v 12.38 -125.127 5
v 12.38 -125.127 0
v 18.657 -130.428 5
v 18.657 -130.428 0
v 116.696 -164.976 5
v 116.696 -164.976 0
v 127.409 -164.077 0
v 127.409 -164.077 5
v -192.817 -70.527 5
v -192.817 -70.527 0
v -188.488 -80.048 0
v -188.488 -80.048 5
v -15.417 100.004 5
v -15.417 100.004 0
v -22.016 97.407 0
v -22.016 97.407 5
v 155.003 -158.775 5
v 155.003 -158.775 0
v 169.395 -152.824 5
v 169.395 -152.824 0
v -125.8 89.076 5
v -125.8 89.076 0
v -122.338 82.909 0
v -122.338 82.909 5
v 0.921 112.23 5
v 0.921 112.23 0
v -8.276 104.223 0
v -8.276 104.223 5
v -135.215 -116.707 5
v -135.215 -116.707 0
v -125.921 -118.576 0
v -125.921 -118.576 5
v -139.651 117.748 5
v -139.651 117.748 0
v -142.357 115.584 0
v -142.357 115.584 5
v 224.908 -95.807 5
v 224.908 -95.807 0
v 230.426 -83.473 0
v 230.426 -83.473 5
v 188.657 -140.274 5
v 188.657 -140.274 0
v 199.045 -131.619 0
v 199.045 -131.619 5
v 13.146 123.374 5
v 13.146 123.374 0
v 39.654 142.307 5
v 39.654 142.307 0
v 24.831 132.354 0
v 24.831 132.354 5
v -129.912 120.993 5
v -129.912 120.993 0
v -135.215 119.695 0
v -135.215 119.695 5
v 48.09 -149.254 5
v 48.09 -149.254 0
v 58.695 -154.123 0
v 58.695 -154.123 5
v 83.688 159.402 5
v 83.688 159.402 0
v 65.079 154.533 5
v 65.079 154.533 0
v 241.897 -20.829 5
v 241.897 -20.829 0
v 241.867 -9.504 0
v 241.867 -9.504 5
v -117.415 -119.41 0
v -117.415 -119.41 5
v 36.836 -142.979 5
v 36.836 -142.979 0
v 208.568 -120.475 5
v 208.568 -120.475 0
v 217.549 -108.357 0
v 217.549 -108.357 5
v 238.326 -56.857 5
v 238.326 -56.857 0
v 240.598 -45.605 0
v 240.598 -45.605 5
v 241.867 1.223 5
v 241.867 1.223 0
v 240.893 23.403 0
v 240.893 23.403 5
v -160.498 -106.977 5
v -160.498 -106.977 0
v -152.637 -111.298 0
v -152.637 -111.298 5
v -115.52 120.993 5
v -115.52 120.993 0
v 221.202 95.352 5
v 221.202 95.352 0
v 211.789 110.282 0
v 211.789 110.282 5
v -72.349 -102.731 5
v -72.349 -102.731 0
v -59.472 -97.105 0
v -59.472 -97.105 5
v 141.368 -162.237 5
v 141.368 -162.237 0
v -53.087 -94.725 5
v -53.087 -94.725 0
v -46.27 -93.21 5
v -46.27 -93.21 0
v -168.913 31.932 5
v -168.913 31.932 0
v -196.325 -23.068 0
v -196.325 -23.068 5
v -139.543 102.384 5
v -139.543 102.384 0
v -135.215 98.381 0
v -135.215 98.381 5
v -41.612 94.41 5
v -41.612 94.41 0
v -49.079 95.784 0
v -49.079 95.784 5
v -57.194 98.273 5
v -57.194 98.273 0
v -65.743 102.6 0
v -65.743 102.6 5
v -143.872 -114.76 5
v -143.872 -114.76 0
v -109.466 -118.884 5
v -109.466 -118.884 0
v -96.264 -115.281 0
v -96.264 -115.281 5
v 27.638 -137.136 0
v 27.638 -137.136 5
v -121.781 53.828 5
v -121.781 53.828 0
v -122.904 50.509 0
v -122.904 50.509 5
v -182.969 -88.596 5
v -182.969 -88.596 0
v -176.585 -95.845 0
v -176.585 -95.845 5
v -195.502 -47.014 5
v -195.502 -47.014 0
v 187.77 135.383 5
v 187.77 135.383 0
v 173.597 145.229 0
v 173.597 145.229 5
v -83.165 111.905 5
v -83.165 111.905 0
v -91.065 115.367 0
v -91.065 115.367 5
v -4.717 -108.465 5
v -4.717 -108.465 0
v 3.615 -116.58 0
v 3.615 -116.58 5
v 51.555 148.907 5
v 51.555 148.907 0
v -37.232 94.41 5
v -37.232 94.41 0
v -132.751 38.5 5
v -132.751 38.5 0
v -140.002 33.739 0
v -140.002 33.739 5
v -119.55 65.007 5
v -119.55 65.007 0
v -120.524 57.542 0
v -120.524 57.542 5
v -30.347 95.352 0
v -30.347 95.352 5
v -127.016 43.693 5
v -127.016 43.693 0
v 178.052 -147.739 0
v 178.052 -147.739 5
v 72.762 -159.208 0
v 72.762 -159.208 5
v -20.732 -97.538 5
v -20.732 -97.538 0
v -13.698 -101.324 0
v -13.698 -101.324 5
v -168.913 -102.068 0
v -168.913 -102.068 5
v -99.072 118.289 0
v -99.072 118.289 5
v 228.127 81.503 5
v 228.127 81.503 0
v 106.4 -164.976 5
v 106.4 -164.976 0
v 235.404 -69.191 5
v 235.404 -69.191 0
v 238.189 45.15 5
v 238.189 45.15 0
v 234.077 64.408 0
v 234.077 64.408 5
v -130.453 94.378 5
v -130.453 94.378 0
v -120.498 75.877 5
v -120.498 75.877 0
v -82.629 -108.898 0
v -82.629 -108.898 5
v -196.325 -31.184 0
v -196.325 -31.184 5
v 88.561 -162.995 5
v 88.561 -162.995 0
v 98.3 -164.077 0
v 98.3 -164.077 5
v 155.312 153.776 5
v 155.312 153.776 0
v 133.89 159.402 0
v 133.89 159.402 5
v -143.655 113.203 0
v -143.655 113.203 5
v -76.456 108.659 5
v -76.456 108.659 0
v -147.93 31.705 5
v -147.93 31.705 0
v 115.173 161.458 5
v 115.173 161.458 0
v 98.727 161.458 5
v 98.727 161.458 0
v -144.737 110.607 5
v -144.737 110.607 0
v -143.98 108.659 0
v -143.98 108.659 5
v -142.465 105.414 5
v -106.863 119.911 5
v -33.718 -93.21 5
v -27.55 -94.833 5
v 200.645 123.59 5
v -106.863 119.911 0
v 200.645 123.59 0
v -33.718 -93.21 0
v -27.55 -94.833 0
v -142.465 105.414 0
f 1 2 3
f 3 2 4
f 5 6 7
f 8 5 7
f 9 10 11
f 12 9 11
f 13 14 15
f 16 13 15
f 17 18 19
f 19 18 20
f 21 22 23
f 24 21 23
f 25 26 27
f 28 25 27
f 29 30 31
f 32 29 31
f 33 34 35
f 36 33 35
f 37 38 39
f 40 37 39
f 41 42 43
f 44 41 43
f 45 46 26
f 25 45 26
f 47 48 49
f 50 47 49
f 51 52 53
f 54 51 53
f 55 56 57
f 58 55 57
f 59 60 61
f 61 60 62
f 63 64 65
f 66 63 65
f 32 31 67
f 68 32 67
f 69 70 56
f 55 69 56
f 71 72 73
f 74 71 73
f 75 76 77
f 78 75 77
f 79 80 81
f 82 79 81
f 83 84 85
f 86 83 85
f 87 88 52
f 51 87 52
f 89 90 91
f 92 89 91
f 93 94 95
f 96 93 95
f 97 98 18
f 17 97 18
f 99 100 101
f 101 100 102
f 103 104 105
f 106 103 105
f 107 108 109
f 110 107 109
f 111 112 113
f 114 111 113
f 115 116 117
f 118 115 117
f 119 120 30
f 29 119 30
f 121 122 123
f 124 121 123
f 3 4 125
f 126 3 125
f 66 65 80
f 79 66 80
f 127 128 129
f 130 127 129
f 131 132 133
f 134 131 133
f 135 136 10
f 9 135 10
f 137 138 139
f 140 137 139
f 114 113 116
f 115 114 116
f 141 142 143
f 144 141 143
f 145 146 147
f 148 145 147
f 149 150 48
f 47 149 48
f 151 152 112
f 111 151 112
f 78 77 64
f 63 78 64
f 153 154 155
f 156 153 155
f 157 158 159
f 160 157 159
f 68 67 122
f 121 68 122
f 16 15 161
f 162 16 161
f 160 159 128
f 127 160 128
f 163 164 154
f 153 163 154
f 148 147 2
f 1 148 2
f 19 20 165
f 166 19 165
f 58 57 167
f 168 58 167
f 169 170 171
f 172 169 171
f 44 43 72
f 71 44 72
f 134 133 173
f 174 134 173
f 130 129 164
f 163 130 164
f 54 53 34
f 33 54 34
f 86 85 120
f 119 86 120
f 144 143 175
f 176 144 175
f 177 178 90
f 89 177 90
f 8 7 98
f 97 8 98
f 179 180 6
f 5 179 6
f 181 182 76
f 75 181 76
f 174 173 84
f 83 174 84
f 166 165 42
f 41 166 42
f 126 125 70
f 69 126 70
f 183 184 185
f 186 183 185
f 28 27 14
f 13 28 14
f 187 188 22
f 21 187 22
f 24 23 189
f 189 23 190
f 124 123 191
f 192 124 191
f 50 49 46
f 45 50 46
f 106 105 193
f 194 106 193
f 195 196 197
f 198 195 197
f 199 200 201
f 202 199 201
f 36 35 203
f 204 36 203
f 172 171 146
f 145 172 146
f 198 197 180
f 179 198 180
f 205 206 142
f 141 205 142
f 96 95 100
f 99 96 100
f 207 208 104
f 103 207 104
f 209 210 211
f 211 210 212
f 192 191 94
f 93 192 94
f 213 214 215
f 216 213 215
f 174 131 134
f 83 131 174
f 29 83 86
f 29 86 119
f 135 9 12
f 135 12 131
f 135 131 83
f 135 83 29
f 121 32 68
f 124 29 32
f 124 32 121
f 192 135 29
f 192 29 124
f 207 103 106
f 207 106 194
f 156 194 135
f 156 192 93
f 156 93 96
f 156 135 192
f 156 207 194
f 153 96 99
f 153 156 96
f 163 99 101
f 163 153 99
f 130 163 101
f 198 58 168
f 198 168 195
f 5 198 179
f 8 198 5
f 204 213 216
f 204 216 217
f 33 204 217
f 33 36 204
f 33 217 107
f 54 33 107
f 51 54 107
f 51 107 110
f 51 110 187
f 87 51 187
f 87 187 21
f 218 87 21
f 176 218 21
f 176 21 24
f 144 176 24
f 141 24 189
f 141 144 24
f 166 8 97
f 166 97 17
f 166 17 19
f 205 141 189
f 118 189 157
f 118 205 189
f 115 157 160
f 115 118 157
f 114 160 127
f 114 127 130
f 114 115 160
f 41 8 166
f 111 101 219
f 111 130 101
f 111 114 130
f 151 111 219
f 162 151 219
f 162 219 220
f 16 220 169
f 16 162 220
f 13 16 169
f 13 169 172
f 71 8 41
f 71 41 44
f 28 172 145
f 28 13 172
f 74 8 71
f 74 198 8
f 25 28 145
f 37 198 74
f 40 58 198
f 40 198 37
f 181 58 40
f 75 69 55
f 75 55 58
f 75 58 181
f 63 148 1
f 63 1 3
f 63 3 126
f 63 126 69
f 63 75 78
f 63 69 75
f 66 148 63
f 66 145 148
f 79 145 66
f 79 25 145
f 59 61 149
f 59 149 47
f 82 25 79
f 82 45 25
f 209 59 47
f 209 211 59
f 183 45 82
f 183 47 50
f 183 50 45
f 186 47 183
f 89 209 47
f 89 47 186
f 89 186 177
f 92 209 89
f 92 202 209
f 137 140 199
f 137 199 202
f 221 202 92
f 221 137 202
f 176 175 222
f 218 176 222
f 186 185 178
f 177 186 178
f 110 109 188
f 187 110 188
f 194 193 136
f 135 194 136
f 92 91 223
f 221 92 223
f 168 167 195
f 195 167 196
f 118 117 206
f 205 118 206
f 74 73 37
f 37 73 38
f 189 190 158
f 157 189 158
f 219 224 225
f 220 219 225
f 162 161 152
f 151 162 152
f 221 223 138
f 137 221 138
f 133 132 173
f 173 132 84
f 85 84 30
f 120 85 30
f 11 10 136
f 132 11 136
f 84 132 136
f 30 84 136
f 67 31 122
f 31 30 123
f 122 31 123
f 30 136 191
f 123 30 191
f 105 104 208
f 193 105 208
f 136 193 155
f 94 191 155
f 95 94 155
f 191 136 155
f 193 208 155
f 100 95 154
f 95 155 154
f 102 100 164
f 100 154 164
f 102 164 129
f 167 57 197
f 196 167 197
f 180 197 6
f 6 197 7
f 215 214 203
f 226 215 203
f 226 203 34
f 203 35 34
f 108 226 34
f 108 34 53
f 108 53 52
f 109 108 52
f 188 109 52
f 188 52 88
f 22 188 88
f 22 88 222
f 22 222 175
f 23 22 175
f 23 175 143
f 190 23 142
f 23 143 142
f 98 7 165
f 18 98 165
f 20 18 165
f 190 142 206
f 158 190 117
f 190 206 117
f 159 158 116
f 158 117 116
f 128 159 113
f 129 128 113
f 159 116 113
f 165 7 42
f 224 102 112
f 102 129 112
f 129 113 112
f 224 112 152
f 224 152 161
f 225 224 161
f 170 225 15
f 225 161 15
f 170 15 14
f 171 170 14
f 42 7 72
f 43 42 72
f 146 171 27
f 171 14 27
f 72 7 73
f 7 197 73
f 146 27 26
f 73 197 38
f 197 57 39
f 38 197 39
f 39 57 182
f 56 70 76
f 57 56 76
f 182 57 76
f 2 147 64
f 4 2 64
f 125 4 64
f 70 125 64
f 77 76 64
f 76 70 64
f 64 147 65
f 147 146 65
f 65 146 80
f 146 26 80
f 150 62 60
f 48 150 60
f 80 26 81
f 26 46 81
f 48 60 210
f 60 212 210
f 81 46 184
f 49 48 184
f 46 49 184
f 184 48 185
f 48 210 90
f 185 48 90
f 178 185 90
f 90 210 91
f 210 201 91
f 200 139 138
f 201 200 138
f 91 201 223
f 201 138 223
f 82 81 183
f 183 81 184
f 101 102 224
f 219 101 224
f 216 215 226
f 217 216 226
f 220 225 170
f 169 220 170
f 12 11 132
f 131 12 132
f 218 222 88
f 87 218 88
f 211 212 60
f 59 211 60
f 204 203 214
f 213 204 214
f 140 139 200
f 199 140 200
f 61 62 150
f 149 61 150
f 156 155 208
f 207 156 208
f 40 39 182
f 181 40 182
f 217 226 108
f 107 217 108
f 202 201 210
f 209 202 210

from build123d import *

# Parameters (mm, degrees)
F0_W     = 37
F0_H     = 69
F1_DEPTH = 5


with BuildPart() as f1:
    # F0 (on Top) → F1 (new body)
    with BuildSketch(Plane.XY):
        Polygon((109.757393, -47.013952), (-190.469548, -47.013952), (-187.938355, -69.176264), (-184.088363, -77.644812), (-178.970914, -85.570573), (-173.10958, -92.22553), (-166.061834, -97.942505), (-158.033386, -102.625757), (-150.505585, -106.763709), (-142.395731, -109.967075), (-134.17314, -111.816847), (-125.182951, -113.624161), (-117.335529, -114.393513), (-110.297666, -113.927758), (-97.994511, -110.570822), (-84.98137, -104.478377), (-74.645462, -98.277857), (-61.347514, -92.467954), (-54.509754, -89.918709), (-46.818863, -88.209901), (-39.777415, -88.209901), (-33.070793, -88.209901), (-25.985741, -90.074082), (-18.618021, -92.997303), (-10.935776, -97.133205), (-1.40856, -104.7078), (7.10493, -112.998784), (15.743346, -121.422512), (21.768701, -126.512042), (30.47871, -133.017234), (39.396258, -138.681565), (50.354269, -144.791737), (60.591184, -149.491585), (74.199441, -154.41068), (89.423326, -158.059629), (98.85233, -159.107134), (106.677154, -159.976425), (116.486558, -159.976425), (126.872966, -159.103989), (140.423232, -157.318581), (153.42437, -154.017258), (167.162878, -148.336862), (175.342116, -143.532352), (185.6123, -136.302521), (195.518968, -128.048335), (204.653845, -117.358152), (213.371967, -105.595887), (220.455531, -93.514166), (225.775129, -81.625274), (230.597933, -67.78821), (233.441157, -55.785481), (235.624263, -44.975688), (236.896344, -20.704121), (236.86714, -9.510057), (236.86714, 1.11357), (235.906968, 22.984027), (233.25353, 44.31771), (229.252552, 63.059144), (223.510394, 79.554792), (216.840677, 92.894226), (207.739533, 107.33053), (197.024369, 120.1263), (184.641449, 131.468644), (171.094149, 140.879356), (153.60487, 149.05483), (132.97725, 154.472187), (114.898965, 156.457659), (99.067456, 156.457659), (84.663291, 154.488749), (66.679821, 149.783781), (53.734493, 144.398522), (42.264603, 138.037948), (27.751352, 128.291809), (16.359527, 119.536983), (4.246612, 108.496011), (-5.338126, 100.151649), (-13.215689, 95.496727), (-20.495536, 92.632523), (-29.407222, 90.433524), (-36.891697, 89.410468), (-42.068154, 89.410468), (-50.267792, 90.919179), (-59.070143, 93.618111), (-68.10425, 98.191586), (-78.777898, 104.228198), (-85.258181, 107.363312), (-92.926764, 110.724328), (-100.445934, 113.46735), (-107.684615, 114.975152), (-115.831575, 115.993351), (-123.636163, 115.993351), (-129.309204, 115.993351), (-133.603284, 114.941916), (-137.040821, 113.433007), (-138.448742, 112.306855), (-139.140668, 111.03855), (-139.344401, 110.549672), (-138.28696, 108.284083), (-136.043459, 105.957887), (-131.906646, 102.131959), (-126.94568, 97.960933), (-121.69705, 91.98096), (-117.6631, 84.796643), (-115.553754, 76.732782), (-114.52125, 64.899556), (-115.629325, 56.405594), (-116.508421, 53.80871), (109.757393, 52.986048), align=None)
        Polygon((241.896685, -20.828539), (241.86714, -9.503535), (241.86714, 1.223274), (240.893394, 23.402912), (238.188565, 45.149782), (234.077219, 64.408205), (228.126581, 81.502758), (221.202205, 95.35151), (211.789387, 110.282193), (200.645468, 123.589971), (187.770458, 135.383053), (173.597124, 145.228644), (155.312446, 153.775932), (133.890159, 159.40199), (115.172707, 161.457659), (98.727311, 161.457659), (83.688435, 159.40199), (65.079178, 154.533299), (51.555006, 148.90724), (39.653731, 142.307444), (24.831248, 132.353646), (13.146367, 123.3736), (0.920512, 112.229684), (-8.275919, 104.223377), (-15.416681, 100.003837), (-22.016478, 97.407195), (-30.347364, 95.35151), (-37.231842, 94.410468), (-41.61199, 94.410468), (-49.078566, 95.784297), (-57.194419, 98.27274), (-65.74312, 102.60048), (-76.456041, 108.659303), (-83.165131, 111.905112), (-91.064569, 115.367308), (-99.0722, 118.288523), (-106.86343, 119.91142), (-115.520338, 120.993351), (-123.636163, 120.993351), (-129.912436, 120.993351), (-135.214792, 119.695033), (-139.651454, 117.747557), (-142.356729, 115.583694), (-143.655285, 113.20343), (-144.737394, 110.606795), (-143.979894, 108.659303), (-142.464952, 105.413509), (-139.543231, 102.384094), (-135.214792, 98.38094), (-130.45349, 94.377787), (-125.800382, 89.076315), (-122.337637, 82.909292), (-120.498056, 75.876723), (-119.549613, 65.006897), (-120.5235, 57.541555), (-121.780652, 53.827879), (-116.508421, 53.80871), (-115.629325, 56.405594), (-114.52125, 64.899556), (-115.553754, 76.732782), (-117.6631, 84.796643), (-121.69705, 91.98096), (-126.94568, 97.960933), (-131.906646, 102.131959), (-136.043459, 105.957887), (-138.28696, 108.284083), (-139.344401, 110.549672), (-139.140668, 111.03855), (-138.448742, 112.306855), (-137.040821, 113.433007), (-133.603284, 114.941916), (-129.309204, 115.993351), (-123.636163, 115.993351), (-115.831575, 115.993351), (-107.684615, 114.975152), (-100.445934, 113.46735), (-92.926764, 110.724328), (-85.258181, 107.363312), (-78.777898, 104.228198), (-68.10425, 98.191586), (-59.070143, 93.618111), (-50.267792, 90.919179), (-42.068154, 89.410468), (-36.891697, 89.410468), (-29.407222, 90.433524), (-20.495536, 92.632523), (-13.215689, 95.496727), (-5.338126, 100.151649), (4.246612, 108.496011), (16.359527, 119.536983), (27.751352, 128.291809), (42.264603, 138.037948), (53.734493, 144.398522), (66.679821, 149.783781), (84.663291, 154.488749), (99.067456, 156.457659), (114.898965, 156.457659), (132.97725, 154.472187), (153.60487, 149.05483), (171.094149, 140.879356), (184.641449, 131.468644), (197.024369, 120.1263), (207.739533, 107.33053), (216.840677, 92.894226), (223.510394, 79.554792), (229.252552, 63.059144), (233.25353, 44.31771), (235.906968, 22.984027), (236.86714, 1.11357), (236.86714, -9.510057), (236.896344, -20.704121), (235.624263, -44.975688), (233.441157, -55.785481), (230.597933, -67.78821), (225.775129, -81.625274), (220.455531, -93.514166), (213.371967, -105.595887), (204.653845, -117.358152), (195.518968, -128.048335), (185.6123, -136.302521), (175.342116, -143.532352), (167.162878, -148.336862), (153.42437, -154.017258), (140.423232, -157.318581), (126.872966, -159.103989), (116.486558, -159.976425), (106.677154, -159.976425), (98.85233, -159.107134), (89.423326, -158.059629), (74.199441, -154.41068), (60.591184, -149.491585), (50.354269, -144.791737), (39.396258, -138.681565), (30.47871, -133.017234), (21.768701, -126.512042), (15.743346, -121.422512), (7.10493, -112.998784), (-1.40856, -104.7078), (-10.935776, -97.133205), (-18.618021, -92.997303), (-25.985741, -90.074082), (-33.070793, -88.209901), (-39.777415, -88.209901), (-46.818863, -88.209901), (-54.509754, -89.918709), (-61.347514, -92.467954), (-74.645462, -98.277857), (-84.98137, -104.478377), (-97.994511, -110.570822), (-110.297666, -113.927758), (-117.335529, -114.393513), (-125.182951, -113.624161), (-134.17314, -111.816847), (-142.395731, -109.967075), (-150.505585, -106.763709), (-158.033386, -102.625757), (-166.061834, -97.942505), (-173.10958, -92.22553), (-178.970914, -85.570573), (-184.088363, -77.644812), (-187.938355, -69.176264), (-190.469548, -47.013952), (-195.502055, -47.013952), (-192.816544, -70.52742), (-188.488075, -80.048439), (-182.969332, -88.595711), (-176.584836, -95.844667), (-168.913197, -102.06773), (-160.497736, -106.976739), (-152.636803, -111.29781), (-143.871701, -114.759998), (-135.214792, -116.707474), (-125.921469, -118.575728), (-117.414903, -119.409702), (-109.466198, -118.883669), (-96.263724, -115.281352), (-82.629097, -108.897942), (-72.349024, -102.730918), (-59.471869, -97.10486), (-53.087402, -94.724611), (-46.270089, -93.2099), (-39.777415, -93.2099), (-33.717573, -93.2099), (-27.549523, -94.832804), (-20.732225, -97.53764), (-13.698481, -101.324407), (-4.716933, -108.46517), (3.615337, -116.57967), (12.380454, -125.12695), (18.656712, -130.428414), (27.638252, -137.136404), (36.836223, -142.978855), (48.090199, -149.254057), (58.694911, -154.122764), (72.762384, -159.207856), (88.561238, -162.994616), (98.300256, -164.076562), (106.400271, -164.976425), (116.696184, -164.976425), (127.409104, -164.076562), (141.368369, -162.237264), (155.002991, -158.775083), (169.3951, -152.824446), (178.052005, -147.739353), (188.656718, -140.274027), (199.045011, -131.618553), (208.567606, -120.474638), (217.549146, -108.356976), (224.907514, -95.80655), (230.426294, -83.472502), (235.404011, -69.190978), (238.325717, -56.856934), (240.598152, -45.604822), align=None)
        Polygon((-116.508421, 53.80871), (-121.780652, 53.827879), (-122.904166, 50.508979), (-127.016189, 43.6928), (-132.751377, 38.499518), (-140.001537, 33.739009), (-147.929535, 31.704532), (-134.216449, 31.556042), (-129.682809, 34.532863), (-123.114868, 40.480213), (-118.342329, 48.391277), (-117.044656, 52.224651), align=None)
        Polygon((-196.325026, -31.183951), (-195.502055, -47.013952), (-190.469548, -47.013952), (109.757393, -47.013952), (109.757393, 52.986048), (-116.508421, 53.80871), (-117.044656, 52.224651), (-118.342329, 48.391277), (-123.114868, 40.480213), (-129.682809, 34.532863), (-134.216449, 31.556042), (-113.145601, 31.327879), (-113.742607, -23.805663), (-196.325026, -23.068249), align=None)
        with Locations((-86.742607, 3.827879)):
            Rectangle(F0_W, F0_H, mode=Mode.SUBTRACT)
        with Locations((16.257393, 3.827879)):
            Rectangle(F0_W, F0_H, mode=Mode.SUBTRACT)
        Polygon((-168.913197, 31.931751), (-196.325026, -23.068249), (-113.742607, -23.805663), (-113.145601, 31.327879), (-134.216449, 31.556042), (-147.929535, 31.704532), align=None)
        with Locations((-86.742607, 3.827879)):
            Rectangle(F0_W, F0_H)
        with Locations((16.257393, 3.827879)):
            Rectangle(F0_W, F0_H)
    extrude(amount=F1_DEPTH)


solid = f1.part
